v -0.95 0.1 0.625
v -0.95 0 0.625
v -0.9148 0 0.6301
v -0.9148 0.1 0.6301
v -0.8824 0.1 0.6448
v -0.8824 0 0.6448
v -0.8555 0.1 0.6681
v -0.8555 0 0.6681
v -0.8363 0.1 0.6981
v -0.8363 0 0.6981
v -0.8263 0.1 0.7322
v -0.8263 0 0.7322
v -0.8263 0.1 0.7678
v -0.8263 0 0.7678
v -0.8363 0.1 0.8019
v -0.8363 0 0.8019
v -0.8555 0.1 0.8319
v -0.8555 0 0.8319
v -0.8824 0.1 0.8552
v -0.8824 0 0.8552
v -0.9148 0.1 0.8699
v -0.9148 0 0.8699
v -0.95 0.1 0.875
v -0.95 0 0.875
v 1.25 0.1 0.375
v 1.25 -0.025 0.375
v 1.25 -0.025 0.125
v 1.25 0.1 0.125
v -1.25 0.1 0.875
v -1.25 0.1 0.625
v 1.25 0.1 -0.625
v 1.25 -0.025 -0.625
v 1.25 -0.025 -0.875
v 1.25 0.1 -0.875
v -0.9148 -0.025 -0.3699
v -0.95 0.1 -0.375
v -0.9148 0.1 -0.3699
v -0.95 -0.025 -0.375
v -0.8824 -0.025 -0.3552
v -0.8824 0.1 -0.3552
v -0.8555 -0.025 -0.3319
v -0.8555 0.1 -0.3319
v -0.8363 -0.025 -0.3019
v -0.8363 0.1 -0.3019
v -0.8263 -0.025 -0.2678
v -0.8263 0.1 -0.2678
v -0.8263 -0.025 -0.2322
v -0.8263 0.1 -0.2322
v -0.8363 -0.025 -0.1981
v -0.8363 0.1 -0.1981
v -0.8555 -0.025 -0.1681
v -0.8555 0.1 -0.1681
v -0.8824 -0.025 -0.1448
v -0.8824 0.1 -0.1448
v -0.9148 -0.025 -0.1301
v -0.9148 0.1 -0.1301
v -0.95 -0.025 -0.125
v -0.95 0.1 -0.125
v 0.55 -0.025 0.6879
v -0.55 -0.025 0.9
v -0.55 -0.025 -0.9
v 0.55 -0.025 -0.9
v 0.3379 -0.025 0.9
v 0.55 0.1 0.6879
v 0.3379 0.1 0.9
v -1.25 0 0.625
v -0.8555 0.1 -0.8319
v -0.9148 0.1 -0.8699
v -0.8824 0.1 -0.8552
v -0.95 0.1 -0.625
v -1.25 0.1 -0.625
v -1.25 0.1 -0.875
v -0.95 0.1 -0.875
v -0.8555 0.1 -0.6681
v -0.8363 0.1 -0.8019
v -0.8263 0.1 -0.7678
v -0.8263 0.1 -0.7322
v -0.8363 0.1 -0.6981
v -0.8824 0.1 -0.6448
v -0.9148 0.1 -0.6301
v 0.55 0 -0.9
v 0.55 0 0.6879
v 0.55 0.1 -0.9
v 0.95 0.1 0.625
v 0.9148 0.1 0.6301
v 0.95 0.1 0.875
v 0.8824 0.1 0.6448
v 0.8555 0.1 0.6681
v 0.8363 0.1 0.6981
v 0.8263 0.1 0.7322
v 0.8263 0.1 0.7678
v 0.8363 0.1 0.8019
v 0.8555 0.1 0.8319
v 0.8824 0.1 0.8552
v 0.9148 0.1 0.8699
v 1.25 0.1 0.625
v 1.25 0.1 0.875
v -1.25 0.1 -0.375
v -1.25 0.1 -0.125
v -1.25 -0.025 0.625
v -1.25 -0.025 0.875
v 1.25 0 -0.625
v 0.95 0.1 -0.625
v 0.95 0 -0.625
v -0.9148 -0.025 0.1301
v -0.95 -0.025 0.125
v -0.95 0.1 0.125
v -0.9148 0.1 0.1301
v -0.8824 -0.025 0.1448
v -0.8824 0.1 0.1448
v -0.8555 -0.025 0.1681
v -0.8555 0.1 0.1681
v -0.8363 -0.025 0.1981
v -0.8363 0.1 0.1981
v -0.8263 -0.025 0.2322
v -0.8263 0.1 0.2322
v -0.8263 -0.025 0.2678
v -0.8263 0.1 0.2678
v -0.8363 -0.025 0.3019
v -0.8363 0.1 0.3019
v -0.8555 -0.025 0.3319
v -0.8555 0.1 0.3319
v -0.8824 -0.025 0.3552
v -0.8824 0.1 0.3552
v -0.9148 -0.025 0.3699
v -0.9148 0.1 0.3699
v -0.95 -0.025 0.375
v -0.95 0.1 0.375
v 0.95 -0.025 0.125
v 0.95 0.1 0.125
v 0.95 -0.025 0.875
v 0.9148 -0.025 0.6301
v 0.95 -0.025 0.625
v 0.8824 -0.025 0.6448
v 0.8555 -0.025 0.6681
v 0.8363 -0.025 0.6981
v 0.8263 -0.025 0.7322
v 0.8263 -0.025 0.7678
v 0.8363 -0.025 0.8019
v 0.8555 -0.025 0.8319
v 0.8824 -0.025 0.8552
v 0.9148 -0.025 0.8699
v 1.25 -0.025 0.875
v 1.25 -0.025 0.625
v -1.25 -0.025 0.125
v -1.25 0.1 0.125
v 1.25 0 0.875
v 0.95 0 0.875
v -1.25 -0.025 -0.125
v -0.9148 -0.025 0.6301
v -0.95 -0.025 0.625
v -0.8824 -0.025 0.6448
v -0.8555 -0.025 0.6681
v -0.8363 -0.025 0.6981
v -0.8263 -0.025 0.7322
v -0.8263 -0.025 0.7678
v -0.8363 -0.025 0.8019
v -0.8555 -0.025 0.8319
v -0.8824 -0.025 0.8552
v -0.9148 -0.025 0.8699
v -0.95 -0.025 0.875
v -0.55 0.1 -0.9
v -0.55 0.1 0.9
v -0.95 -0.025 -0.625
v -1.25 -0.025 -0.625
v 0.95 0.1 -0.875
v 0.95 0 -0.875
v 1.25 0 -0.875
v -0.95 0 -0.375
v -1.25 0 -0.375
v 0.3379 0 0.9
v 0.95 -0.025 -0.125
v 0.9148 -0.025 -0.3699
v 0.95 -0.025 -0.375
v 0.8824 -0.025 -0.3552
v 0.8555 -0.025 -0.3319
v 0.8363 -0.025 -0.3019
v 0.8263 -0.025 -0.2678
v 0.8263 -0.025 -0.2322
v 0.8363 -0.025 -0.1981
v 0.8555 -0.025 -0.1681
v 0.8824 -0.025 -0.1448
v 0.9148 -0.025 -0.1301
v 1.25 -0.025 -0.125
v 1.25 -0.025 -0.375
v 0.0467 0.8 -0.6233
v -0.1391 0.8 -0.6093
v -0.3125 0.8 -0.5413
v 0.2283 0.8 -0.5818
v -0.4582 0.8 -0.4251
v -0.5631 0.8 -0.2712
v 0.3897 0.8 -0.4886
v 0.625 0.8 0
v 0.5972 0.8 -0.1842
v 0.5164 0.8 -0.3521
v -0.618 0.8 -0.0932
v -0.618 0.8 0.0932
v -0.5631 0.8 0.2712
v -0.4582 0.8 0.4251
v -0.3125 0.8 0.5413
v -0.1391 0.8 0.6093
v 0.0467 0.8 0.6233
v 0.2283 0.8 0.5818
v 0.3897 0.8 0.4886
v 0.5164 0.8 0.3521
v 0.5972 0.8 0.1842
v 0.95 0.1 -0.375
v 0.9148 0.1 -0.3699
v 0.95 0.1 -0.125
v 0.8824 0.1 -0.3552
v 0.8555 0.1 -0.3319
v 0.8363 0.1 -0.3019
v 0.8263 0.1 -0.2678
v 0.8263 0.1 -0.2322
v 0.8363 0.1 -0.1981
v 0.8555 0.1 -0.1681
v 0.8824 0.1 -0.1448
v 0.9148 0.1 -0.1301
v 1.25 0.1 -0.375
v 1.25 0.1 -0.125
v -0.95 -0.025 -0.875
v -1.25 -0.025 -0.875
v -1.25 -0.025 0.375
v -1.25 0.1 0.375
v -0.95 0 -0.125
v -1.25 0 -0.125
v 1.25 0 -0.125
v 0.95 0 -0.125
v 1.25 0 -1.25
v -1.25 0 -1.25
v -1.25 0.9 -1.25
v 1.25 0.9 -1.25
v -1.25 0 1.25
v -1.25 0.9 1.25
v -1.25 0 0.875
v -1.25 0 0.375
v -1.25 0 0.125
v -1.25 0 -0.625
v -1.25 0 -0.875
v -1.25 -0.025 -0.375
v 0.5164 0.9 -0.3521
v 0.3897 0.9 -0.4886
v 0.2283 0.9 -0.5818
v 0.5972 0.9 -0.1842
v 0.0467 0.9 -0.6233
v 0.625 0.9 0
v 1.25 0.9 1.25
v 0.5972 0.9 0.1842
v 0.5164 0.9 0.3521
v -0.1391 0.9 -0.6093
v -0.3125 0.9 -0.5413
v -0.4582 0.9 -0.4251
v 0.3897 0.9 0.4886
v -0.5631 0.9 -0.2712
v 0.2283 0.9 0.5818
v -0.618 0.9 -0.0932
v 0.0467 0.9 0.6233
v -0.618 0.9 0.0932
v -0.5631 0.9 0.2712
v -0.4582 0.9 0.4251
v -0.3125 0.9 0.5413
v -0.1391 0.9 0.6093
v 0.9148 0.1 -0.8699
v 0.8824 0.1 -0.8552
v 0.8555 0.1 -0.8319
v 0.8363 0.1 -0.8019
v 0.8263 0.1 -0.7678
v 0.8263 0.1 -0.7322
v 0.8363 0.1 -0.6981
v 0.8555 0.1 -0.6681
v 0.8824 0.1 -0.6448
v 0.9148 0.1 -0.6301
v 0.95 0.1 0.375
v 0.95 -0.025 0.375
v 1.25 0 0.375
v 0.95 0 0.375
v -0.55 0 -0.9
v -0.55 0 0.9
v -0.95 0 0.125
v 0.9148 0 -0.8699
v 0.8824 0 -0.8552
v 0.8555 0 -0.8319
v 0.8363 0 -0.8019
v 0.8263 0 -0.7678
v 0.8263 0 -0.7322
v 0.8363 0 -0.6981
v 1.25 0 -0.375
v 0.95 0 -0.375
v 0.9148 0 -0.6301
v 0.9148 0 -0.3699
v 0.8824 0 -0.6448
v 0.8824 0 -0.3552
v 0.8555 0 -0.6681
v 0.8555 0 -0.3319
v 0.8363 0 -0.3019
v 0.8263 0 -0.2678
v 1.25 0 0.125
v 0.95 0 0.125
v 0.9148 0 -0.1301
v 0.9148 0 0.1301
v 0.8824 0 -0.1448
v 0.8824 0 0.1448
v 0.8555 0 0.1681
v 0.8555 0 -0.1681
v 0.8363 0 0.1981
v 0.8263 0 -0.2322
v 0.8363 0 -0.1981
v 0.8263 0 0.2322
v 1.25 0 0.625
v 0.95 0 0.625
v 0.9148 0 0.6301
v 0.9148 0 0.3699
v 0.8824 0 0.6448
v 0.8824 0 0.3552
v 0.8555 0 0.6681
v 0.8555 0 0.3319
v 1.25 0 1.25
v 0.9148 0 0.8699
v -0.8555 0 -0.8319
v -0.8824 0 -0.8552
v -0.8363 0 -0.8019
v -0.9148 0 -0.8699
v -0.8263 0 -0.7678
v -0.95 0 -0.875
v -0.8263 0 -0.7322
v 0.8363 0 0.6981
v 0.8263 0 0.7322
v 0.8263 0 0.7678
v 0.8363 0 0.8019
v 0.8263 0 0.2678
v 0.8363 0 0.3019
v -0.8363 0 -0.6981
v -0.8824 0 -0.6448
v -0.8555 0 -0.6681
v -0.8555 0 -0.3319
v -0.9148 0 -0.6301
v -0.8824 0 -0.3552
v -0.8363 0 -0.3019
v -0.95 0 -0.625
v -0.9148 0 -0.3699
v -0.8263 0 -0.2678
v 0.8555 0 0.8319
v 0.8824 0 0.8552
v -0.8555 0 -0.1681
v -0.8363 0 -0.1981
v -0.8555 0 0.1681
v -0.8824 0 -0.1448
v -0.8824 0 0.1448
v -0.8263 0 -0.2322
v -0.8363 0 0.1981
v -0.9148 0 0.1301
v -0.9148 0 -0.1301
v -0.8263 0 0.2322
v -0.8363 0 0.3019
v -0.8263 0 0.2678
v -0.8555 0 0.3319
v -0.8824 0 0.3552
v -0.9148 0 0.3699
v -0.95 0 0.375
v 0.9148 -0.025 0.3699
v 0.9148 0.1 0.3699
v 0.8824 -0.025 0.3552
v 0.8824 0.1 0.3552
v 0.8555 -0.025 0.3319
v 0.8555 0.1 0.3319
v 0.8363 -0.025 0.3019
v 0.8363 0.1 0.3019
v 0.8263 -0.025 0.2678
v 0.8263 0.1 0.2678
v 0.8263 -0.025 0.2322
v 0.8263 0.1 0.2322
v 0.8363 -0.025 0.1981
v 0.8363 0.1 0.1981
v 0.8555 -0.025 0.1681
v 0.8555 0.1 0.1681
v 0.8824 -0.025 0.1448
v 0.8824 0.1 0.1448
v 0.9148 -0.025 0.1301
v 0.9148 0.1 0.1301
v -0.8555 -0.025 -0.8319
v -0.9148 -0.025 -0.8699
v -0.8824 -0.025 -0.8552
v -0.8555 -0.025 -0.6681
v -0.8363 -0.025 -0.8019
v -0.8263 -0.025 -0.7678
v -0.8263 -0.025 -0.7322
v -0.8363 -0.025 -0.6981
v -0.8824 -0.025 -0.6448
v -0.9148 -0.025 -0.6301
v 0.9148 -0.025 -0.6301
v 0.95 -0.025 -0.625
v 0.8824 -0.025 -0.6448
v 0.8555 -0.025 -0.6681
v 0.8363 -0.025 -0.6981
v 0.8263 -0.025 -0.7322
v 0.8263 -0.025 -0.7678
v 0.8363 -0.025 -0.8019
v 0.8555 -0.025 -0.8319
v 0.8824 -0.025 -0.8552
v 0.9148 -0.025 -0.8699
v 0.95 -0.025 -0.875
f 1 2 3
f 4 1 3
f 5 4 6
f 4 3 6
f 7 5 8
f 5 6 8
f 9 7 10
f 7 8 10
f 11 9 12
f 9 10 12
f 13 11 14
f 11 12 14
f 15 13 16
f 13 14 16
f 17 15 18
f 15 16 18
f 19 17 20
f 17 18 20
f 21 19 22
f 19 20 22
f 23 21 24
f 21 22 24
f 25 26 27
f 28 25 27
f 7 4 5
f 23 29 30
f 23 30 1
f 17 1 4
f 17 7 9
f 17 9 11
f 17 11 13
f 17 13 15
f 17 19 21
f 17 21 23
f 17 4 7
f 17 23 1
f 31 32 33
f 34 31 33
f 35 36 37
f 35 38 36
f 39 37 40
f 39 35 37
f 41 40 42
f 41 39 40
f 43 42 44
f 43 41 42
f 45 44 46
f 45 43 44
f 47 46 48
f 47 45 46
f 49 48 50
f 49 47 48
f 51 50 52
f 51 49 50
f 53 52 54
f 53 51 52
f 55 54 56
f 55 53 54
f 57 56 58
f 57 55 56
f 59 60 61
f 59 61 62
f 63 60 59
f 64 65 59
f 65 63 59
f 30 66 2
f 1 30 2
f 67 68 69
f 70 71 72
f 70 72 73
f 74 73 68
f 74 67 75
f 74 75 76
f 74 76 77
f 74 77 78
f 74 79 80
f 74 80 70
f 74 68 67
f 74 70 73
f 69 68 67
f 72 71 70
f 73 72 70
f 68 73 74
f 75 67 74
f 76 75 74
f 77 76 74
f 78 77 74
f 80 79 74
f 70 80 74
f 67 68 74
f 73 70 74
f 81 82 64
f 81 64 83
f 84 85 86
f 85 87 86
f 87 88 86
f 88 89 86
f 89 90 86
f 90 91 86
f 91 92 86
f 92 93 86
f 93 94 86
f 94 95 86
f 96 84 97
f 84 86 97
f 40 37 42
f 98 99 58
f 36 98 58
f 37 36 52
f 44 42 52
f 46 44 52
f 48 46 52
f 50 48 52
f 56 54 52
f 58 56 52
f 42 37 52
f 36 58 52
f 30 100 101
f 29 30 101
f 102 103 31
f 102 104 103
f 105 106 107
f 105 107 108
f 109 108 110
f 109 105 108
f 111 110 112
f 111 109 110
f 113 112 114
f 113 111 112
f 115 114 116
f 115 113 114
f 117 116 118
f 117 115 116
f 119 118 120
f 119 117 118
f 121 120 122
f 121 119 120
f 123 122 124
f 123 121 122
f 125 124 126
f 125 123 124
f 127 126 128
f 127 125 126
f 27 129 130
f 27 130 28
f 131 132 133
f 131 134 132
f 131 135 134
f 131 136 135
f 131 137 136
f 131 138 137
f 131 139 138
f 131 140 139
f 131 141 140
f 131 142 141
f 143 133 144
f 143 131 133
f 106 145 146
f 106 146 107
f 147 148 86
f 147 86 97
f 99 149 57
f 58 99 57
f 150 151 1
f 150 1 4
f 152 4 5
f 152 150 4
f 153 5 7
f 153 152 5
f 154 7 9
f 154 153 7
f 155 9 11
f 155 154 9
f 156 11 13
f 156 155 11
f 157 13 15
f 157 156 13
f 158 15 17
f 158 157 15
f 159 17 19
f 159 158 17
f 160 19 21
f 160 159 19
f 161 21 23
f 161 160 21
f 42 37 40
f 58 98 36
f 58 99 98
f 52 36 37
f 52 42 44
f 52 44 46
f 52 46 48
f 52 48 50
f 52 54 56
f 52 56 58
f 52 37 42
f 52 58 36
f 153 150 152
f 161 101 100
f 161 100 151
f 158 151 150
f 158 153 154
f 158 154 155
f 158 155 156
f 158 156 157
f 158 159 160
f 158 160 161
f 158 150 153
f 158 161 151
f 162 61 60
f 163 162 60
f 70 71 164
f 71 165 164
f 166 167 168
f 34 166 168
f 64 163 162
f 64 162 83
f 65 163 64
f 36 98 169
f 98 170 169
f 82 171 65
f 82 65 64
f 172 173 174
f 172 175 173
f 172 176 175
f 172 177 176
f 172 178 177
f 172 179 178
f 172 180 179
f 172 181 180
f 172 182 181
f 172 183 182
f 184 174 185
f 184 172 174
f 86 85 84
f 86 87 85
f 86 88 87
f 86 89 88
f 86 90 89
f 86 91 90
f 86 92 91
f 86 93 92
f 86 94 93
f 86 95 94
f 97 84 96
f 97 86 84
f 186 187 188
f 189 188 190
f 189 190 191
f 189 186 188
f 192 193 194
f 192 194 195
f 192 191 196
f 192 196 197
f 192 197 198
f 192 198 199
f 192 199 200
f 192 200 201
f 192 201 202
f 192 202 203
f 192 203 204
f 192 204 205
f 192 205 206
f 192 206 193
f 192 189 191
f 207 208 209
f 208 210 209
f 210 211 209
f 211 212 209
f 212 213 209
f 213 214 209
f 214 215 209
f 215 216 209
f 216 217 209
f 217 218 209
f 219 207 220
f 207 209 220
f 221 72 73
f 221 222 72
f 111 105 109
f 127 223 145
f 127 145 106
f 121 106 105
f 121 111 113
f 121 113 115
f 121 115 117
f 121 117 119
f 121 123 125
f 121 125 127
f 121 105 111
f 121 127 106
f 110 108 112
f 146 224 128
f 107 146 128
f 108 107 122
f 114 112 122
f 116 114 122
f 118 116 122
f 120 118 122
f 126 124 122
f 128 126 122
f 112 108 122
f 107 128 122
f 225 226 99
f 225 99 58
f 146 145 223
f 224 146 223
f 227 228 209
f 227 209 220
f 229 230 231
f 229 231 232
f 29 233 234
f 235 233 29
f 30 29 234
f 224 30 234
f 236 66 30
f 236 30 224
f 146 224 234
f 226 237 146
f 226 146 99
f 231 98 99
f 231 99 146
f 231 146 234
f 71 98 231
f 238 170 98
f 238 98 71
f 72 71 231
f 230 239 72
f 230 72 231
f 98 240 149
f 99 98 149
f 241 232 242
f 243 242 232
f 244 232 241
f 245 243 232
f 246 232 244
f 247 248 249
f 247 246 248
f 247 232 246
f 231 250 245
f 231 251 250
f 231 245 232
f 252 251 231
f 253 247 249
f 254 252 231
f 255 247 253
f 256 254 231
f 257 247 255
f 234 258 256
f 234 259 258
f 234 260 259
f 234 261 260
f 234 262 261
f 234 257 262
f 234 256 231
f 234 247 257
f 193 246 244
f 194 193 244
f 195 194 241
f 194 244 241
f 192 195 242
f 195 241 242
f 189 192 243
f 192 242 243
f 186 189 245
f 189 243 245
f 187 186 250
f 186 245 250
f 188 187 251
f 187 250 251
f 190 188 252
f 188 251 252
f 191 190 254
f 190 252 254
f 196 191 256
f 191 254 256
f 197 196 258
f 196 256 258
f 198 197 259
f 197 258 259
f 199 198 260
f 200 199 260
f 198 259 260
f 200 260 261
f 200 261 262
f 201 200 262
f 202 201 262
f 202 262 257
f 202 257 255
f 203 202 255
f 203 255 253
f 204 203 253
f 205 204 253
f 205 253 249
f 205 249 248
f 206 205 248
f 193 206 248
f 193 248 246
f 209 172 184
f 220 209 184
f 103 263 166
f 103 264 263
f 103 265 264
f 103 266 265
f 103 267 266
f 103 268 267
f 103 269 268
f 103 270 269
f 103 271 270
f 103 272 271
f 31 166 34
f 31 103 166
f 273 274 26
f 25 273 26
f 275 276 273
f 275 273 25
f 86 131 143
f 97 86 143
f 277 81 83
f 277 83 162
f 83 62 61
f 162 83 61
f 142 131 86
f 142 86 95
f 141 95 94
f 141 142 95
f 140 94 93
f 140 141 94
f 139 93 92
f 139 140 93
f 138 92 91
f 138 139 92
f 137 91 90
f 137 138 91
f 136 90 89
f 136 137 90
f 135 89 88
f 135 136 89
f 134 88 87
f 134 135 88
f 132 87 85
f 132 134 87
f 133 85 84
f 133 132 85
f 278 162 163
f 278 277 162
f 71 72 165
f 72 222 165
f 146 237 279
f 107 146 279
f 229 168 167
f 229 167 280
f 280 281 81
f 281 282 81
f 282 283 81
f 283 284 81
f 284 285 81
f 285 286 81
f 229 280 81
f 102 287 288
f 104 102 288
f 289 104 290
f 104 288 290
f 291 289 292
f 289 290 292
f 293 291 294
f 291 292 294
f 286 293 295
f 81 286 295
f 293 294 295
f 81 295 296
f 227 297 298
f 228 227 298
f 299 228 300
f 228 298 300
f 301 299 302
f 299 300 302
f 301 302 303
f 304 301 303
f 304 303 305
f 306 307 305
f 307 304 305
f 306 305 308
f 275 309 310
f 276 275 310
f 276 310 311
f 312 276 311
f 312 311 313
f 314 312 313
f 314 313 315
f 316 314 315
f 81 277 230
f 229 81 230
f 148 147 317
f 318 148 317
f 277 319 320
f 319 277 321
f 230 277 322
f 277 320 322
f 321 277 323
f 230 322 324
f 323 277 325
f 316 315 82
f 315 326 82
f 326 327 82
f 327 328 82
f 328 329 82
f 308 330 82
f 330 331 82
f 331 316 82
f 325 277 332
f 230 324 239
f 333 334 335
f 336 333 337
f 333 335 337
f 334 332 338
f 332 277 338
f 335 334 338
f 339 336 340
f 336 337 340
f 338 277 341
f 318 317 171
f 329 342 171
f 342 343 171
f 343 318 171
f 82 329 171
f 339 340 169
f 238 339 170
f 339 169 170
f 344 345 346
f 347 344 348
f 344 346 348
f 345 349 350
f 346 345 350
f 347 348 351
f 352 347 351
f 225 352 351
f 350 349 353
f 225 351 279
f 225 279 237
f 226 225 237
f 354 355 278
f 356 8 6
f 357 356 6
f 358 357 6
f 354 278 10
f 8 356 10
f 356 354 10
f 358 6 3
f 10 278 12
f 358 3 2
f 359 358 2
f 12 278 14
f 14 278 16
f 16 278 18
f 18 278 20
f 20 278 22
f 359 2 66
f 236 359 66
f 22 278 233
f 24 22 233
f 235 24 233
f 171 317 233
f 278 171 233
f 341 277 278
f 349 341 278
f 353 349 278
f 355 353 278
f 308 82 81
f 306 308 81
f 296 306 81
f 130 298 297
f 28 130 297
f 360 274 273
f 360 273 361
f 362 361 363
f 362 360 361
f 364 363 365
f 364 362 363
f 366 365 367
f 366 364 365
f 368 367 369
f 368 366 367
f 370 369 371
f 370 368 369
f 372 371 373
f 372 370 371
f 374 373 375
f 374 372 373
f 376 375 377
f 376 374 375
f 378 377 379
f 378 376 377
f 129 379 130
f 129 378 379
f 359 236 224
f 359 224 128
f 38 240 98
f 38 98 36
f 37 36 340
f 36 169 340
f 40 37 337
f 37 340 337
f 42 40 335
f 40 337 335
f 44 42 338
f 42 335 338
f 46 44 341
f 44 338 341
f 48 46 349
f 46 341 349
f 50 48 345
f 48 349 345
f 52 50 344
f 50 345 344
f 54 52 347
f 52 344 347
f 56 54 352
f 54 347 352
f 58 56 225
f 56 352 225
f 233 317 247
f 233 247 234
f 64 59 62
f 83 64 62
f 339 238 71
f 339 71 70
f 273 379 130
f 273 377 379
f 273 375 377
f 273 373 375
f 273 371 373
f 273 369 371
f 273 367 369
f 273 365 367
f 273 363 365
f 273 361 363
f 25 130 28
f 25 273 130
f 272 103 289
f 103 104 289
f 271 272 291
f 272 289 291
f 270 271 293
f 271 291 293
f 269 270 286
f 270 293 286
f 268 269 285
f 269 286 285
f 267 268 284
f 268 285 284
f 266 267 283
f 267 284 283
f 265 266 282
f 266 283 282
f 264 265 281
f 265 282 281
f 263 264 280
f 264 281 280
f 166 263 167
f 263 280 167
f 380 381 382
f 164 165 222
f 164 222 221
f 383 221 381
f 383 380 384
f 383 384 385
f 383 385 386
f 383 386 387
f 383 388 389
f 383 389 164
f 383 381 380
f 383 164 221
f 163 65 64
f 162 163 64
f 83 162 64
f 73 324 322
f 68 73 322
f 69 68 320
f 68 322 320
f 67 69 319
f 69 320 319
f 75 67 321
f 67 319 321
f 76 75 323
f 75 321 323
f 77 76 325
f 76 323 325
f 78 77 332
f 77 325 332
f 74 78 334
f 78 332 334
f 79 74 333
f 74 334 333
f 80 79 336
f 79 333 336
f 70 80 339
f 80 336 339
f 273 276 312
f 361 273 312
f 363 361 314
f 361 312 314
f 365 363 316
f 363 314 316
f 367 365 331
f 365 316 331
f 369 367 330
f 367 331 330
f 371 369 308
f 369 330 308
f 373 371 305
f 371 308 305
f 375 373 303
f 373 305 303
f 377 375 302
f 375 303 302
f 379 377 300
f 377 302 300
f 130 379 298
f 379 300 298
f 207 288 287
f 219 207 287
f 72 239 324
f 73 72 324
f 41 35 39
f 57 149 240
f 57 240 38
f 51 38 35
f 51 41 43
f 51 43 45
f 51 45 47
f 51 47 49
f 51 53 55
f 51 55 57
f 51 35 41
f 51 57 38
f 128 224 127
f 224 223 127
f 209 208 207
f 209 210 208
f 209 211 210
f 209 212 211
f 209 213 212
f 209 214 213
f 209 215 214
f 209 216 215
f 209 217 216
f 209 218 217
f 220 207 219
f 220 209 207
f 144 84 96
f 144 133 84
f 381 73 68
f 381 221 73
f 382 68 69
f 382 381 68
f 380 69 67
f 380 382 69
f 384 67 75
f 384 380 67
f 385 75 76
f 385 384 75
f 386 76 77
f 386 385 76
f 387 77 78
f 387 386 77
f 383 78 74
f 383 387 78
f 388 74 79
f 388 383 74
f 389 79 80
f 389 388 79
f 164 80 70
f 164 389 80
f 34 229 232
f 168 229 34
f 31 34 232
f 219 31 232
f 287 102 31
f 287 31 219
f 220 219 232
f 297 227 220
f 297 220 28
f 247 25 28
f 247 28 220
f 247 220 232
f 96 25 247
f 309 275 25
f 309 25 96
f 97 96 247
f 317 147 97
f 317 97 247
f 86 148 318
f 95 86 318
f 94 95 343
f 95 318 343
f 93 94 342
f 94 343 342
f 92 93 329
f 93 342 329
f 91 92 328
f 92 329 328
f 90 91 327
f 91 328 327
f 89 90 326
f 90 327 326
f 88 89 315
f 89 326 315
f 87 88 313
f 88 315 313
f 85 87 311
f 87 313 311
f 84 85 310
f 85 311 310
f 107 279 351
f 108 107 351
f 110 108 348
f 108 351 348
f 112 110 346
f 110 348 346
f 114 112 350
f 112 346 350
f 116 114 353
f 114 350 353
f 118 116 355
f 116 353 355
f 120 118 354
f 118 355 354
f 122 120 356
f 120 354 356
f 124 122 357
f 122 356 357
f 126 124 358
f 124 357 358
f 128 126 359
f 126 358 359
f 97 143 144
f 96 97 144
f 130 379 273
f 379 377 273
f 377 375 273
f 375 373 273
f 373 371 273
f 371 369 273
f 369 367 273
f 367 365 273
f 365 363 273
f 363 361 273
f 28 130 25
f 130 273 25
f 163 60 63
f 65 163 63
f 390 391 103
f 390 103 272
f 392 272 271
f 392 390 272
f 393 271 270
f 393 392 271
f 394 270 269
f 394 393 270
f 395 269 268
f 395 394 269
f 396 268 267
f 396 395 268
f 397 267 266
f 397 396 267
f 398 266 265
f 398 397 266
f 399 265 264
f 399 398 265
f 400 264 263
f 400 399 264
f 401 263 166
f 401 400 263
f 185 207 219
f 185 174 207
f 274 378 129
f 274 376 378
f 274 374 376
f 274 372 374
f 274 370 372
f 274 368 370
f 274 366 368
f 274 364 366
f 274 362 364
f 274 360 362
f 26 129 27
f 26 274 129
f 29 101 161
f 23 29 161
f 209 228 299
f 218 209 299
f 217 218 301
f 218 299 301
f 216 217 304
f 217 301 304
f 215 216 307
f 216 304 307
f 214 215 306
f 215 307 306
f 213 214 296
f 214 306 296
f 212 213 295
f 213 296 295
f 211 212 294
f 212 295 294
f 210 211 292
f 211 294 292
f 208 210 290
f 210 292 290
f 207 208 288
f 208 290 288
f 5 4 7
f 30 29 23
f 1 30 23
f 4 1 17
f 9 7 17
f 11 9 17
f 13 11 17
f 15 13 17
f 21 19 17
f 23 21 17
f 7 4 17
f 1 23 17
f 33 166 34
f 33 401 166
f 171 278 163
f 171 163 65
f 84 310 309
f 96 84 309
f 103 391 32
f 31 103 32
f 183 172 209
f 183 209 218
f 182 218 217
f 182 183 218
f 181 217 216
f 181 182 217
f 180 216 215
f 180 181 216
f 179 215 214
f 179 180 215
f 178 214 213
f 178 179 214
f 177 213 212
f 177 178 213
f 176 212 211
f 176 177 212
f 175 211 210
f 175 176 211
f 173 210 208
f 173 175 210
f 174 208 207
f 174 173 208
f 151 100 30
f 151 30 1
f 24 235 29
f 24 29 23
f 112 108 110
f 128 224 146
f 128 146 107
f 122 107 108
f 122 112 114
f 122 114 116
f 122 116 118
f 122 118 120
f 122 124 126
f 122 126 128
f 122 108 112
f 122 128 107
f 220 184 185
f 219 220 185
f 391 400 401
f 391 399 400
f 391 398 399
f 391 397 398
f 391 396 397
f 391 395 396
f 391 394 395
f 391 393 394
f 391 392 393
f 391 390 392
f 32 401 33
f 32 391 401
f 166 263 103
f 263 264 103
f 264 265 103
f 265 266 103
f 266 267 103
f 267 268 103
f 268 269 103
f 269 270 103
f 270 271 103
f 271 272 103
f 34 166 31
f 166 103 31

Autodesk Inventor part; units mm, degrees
ref_plane "YZ Plane" through (0, 0, 0) normal (1, 0, 0) x (0, 1, 0)
ref_plane "XZ Plane" through (0, 0, 0) normal (0, 1, 0) x (-1, 0, 0)
ref_plane "XY Plane" through (0, 0, 0) normal (0, 0, 1) x (1, 0, 0)
sketch "Sketch1" plane through (0, 0, 0) normal (0, 1, 0) x (-1, 0, 0)
  line L0 (1.25, -1.25) -> (-1.25, -1.25)
  line L1 (-1.25, -1.25) -> (-1.25, 1.25)
  line L2 (-1.25, 1.25) -> (1.25, 1.25)
  line L3 (1.25, 1.25) -> (1.25, -1.25)
  line L4 (1.25, -1.25) -> (-1.25, 1.25) construction
  line L5 (-1.25, -1.25) -> (1.25, 1.25) construction
  point P0 (0, 0)
  dimension "d0" = 2.5
extrude "Extrusion1" add sketch "Sketch1" along normal blind 0.9
sketch "Sketch2" plane through (0, 0, 0) normal (0, -1, 0) x (1, 0, 0)
  line L0 (-1.25, -1.25) -> (-1.25, 1.25) projected
  line L1 (-1.25, 0.875) -> (-0.95, 0.875)
  line L2 (-1.25, 0.625) -> (-0.95, 0.625)
  arc A0 (-0.95, 0.625) -> (-0.95, 0.875) centre (-0.95, 0.75) ccw
  point P0 (0, 0)
  dimension "d3" = 0.25
  dimension "d4" = 0.3
  dimension "d6" = 0.875
extrude "Extrusion2" cut sketch "Sketch2" against normal blind 0.1
pattern_linear "Rectangular Pattern1" count 4 spacing 0.5 along (0, 0, -1) of "Extrusion2"
extrude "Extrusion3" add sketch "Sketch2" against normal blind 0.1 and the other way blind 0.025 separate body
pattern_linear "Rectangular Pattern4" count 4 spacing 0.5 along (0, 0, -1) of "Extrusion3" bodies 2
mirror "Mirror1" about plane through (0, 0, 0) normal (1, 0, 0) of "Extrusion2", "Rectangular Pattern1" bodies 1
mirror "Mirror2" about plane through (0, 0, 0) normal (1, 0, 0) of "Extrusion3", "Rectangular Pattern4" bodies 2
sketch "Sketch3" plane through (0, 0, 0) normal (0, -1, 0) x (1, 0, 0)
  line L0 (-0.55, 0.9) -> (0.55, 0.9)
  line L1 (0.55, 0.9) -> (0.55, -0.9)
  line L2 (0.55, -0.9) -> (-0.55, -0.9)
  line L3 (-0.55, -0.9) -> (-0.55, 0.9)
  line L4 (-0.55, 0.9) -> (0.55, -0.9) construction
  line L5 (0.55, 0.9) -> (-0.55, -0.9) construction
  line L6 (0.3379, 0.9) -> (0.55, 0.6879)
  point P0 (0, 0)
  dimension "d23" = 45
  dimension "d24" = 0.3
  dimension "d25" = 1.8
  dimension "d26" = 1.1
extrude "Extrusion4" cut sketch "Sketch3" against normal blind 0.1 contours L0 L6 L1 L2 L3 bodies 1
extrude "Extrusion5" add sketch "Sketch3" against normal blind 0.1 and the other way blind 0.025 contours L0 L6 L1 L2 L3 bodies 2
sketch "Sketch4" plane through (0, 0.9, 0) normal (0, 1, 0) x (1, 0, 0)
  circle A0 centre (0, 0) radius 0.625
  dimension "d31" = 1.25
extrude "Extrusion6" cut sketch "Sketch4" against normal blind 0.1 bodies 1
properties part number "SHT3x-DIS"
